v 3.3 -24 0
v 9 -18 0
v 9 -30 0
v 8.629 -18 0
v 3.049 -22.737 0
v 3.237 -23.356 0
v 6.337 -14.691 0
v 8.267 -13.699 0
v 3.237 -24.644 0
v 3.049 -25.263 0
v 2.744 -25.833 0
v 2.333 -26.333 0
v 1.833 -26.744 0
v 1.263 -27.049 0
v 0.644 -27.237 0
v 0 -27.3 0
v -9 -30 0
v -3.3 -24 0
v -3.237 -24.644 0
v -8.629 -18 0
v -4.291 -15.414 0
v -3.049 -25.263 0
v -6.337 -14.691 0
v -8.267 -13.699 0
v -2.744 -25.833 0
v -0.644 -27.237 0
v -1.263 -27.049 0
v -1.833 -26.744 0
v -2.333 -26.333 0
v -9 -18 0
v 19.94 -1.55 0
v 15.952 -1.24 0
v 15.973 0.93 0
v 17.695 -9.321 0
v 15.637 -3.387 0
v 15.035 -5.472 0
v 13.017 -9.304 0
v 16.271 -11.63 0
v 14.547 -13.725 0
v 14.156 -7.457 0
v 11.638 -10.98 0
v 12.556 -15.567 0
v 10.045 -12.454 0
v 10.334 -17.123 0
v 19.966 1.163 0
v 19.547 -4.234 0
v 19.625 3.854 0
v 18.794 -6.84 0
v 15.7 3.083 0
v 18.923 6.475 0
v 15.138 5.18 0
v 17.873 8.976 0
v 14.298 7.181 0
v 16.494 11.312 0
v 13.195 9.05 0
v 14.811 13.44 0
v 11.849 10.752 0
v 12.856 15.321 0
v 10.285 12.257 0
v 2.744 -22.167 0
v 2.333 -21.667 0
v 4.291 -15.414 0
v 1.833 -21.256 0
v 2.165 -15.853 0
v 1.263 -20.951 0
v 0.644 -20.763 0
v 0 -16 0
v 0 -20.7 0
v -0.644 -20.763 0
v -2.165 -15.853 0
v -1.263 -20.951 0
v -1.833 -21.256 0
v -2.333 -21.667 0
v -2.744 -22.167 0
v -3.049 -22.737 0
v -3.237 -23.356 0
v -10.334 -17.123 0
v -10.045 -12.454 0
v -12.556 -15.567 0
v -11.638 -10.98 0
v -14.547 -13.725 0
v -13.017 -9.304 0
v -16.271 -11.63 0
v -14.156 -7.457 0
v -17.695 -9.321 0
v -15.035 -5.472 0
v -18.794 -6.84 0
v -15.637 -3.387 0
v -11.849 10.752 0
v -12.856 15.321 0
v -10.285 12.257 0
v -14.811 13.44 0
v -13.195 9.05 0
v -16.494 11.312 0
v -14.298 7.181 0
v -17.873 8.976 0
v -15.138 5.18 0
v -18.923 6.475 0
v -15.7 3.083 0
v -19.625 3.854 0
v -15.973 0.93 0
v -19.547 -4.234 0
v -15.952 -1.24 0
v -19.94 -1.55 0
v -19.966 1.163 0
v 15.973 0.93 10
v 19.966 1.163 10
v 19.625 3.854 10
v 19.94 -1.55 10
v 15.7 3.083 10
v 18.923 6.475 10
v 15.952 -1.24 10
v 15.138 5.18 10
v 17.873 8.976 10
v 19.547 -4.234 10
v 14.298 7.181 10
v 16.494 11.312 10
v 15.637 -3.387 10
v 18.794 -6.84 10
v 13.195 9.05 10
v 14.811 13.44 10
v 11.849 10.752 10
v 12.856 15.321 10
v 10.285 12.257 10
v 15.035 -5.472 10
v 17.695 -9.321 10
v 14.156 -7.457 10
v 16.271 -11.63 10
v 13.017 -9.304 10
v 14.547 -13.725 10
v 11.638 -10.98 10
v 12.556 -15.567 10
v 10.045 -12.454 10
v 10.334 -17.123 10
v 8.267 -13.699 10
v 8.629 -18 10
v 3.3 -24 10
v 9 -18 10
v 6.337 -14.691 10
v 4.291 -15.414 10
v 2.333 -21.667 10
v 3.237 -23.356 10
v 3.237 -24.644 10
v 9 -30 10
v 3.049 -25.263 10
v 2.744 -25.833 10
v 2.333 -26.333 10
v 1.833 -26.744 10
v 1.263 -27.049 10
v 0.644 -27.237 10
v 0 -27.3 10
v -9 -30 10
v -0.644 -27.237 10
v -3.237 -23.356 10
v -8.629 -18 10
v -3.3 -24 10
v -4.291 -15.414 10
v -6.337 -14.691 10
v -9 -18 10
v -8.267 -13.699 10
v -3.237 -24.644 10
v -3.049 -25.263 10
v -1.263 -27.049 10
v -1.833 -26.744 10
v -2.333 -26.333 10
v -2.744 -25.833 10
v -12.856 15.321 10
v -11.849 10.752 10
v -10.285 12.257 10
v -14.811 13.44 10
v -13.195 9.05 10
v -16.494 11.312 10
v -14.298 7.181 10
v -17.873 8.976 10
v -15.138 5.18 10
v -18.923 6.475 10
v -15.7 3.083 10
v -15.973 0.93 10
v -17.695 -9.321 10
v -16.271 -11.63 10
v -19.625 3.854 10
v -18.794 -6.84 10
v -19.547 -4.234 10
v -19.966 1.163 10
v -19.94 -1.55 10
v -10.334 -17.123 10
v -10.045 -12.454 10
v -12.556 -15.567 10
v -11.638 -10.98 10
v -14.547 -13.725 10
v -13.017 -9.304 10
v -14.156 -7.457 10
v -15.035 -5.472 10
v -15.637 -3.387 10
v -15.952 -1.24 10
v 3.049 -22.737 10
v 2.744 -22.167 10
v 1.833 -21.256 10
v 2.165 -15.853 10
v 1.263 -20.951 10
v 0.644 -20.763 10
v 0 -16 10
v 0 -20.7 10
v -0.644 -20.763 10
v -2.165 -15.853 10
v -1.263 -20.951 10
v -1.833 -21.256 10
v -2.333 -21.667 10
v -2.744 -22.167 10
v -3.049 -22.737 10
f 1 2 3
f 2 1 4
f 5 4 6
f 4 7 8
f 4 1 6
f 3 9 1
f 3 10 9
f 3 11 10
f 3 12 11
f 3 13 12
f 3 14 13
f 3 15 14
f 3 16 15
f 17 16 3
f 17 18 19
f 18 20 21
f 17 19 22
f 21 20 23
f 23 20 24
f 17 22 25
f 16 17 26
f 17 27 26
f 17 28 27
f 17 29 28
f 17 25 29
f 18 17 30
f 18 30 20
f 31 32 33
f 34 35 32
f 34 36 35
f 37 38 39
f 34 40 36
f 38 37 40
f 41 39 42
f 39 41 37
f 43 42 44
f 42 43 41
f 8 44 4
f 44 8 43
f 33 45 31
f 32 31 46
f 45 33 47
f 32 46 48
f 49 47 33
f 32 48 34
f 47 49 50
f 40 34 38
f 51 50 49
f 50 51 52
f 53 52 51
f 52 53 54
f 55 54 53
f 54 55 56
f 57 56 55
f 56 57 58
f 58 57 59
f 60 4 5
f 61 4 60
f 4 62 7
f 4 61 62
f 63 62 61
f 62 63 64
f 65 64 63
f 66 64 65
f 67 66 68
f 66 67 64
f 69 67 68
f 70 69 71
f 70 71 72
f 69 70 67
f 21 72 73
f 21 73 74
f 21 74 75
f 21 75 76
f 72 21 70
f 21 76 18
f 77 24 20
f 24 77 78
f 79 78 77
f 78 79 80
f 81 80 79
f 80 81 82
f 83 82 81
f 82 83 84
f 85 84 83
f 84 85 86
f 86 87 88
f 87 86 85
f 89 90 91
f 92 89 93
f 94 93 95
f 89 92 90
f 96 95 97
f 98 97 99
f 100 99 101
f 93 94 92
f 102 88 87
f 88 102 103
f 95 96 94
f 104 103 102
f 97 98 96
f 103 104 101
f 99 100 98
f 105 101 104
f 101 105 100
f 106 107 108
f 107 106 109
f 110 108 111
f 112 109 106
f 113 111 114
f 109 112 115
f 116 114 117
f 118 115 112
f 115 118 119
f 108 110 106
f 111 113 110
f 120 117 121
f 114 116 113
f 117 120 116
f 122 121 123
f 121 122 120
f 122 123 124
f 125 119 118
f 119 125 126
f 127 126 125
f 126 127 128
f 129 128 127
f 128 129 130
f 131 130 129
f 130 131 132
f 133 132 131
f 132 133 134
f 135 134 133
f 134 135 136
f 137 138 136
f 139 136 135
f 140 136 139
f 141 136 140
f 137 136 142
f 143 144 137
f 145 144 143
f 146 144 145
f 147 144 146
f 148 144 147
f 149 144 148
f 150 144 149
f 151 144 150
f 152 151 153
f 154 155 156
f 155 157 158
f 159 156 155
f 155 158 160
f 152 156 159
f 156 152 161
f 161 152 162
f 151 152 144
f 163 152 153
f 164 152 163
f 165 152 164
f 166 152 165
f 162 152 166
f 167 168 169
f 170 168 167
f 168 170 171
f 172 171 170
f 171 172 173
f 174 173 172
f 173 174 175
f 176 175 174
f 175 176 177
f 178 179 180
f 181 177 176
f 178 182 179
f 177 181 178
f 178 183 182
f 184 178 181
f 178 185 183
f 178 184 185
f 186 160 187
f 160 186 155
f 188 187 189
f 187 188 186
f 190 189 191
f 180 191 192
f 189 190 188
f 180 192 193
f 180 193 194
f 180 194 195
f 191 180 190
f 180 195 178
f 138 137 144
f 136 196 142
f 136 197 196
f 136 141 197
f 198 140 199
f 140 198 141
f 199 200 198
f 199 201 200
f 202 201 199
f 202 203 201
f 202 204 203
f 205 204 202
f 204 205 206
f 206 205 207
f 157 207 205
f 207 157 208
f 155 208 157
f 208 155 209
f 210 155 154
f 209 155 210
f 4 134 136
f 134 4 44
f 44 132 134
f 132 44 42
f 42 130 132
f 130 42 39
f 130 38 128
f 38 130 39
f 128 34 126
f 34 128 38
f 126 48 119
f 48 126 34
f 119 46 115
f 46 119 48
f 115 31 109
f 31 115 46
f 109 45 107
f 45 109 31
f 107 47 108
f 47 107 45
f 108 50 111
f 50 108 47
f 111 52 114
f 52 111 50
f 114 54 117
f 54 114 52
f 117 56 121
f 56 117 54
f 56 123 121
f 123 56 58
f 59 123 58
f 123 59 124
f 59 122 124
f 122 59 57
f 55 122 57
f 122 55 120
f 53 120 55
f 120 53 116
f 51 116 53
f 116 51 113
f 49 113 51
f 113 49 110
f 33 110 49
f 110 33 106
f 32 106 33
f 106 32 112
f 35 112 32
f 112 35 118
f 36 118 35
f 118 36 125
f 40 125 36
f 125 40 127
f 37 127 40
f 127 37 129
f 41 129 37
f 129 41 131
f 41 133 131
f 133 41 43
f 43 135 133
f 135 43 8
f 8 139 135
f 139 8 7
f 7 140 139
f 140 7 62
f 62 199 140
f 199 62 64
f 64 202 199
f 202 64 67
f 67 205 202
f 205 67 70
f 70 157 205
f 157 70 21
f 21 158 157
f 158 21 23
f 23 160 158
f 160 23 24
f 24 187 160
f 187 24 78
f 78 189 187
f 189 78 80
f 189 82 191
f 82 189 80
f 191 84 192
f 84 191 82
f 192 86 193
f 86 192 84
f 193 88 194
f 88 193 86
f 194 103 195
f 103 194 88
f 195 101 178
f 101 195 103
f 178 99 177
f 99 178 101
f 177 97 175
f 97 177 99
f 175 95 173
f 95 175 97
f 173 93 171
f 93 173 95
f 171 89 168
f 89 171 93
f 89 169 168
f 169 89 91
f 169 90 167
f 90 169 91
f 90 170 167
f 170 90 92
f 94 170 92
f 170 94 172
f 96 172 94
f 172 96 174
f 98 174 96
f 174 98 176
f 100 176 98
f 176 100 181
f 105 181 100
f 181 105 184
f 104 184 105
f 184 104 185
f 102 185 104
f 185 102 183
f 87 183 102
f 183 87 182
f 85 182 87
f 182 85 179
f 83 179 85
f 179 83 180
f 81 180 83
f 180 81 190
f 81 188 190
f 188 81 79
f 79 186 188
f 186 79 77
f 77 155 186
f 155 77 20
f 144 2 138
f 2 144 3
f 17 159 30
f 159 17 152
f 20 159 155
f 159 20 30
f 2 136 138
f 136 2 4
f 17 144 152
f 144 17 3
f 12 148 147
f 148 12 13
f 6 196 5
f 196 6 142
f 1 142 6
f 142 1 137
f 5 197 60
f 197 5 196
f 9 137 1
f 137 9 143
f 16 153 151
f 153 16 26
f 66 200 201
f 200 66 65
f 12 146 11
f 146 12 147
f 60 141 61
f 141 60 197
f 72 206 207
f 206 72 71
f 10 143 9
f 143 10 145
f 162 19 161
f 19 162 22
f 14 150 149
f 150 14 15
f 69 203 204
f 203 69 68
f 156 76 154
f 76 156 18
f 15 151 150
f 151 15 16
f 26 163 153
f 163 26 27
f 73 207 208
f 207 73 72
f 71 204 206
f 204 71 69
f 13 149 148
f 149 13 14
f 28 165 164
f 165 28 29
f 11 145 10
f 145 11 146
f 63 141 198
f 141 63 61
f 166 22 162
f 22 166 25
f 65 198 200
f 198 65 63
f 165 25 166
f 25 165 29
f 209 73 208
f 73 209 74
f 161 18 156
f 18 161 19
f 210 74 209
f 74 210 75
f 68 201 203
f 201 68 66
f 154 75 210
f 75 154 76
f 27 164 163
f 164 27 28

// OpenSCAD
$fn = 32;

// ----------------------------------------------------------------------
// Spring clip: 40 mm outside, 4 mm band, 80 degree opening
// ----------------------------------------------------------------------

// --- parameters (mm) ---
outer_r = 20;             // clip outside radius
inner_r = 16;             // clip bore radius
band = 4;                 // band thickness
clip_w = 10;              // clip width
opening = 80;             // opening angle
tab_w = 18;               // tab width
tab_len = 10;             // tab length past the clip
tab_hole = 6.6;           // tab fixing hole

clip_profile = [[-12.856, 15.321], [-14.811, 13.44], [-16.494, 11.312], [-17.873, 8.976], [-18.923, 6.475], [-19.625, 3.854], [-19.966, 1.163], [-19.94, -1.55], [-19.547, -4.234], [-18.794, -6.84], [-17.695, -9.321], [-16.271, -11.63], [-14.547, -13.725], [-12.556, -15.567], [-10.334, -17.123], [-7.922, -18.364], [-5.363, -19.267], [-2.707, -19.816], [0, -20], [2.707, -19.816], [5.363, -19.267], [7.922, -18.364], [10.334, -17.123], [12.556, -15.567], [14.547, -13.725], [16.271, -11.63], [17.695, -9.321], [18.794, -6.84], [19.547, -4.234], [19.94, -1.55], [19.966, 1.163], [19.625, 3.854], [18.923, 6.475], [17.873, 8.976], [16.494, 11.312], [14.811, 13.44], [12.856, 15.321], [10.285, 12.257], [11.849, 10.752], [13.195, 9.05], [14.298, 7.181], [15.138, 5.18], [15.7, 3.083], [15.973, 0.93], [15.952, -1.24], [15.637, -3.387], [15.035, -5.472], [14.156, -7.457], [13.017, -9.304], [11.638, -10.98], [10.045, -12.454], [8.267, -13.699], [6.337, -14.691], [4.291, -15.414], [2.165, -15.853], [0, -16], [-2.165, -15.853], [-4.291, -15.414], [-6.337, -14.691], [-8.267, -13.699], [-10.045, -12.454], [-11.638, -10.98], [-13.017, -9.304], [-14.156, -7.457], [-15.035, -5.472], [-15.637, -3.387], [-15.952, -1.24], [-15.973, 0.93], [-15.7, 3.083], [-15.138, 5.18], [-14.298, 7.181], [-13.195, 9.05], [-11.849, 10.752], [-10.285, 12.257]];

difference() {
  union() {
    linear_extrude(height = clip_w) polygon(clip_profile);
    /* mounting tab, sunk 2 mm into the band */
    translate([-9, -30, 0]) cube([tab_w, 12, clip_w]);
  }
  translate([0, -24, -2.5]) cylinder(h = clip_w + 5, d = tab_hole);
}
